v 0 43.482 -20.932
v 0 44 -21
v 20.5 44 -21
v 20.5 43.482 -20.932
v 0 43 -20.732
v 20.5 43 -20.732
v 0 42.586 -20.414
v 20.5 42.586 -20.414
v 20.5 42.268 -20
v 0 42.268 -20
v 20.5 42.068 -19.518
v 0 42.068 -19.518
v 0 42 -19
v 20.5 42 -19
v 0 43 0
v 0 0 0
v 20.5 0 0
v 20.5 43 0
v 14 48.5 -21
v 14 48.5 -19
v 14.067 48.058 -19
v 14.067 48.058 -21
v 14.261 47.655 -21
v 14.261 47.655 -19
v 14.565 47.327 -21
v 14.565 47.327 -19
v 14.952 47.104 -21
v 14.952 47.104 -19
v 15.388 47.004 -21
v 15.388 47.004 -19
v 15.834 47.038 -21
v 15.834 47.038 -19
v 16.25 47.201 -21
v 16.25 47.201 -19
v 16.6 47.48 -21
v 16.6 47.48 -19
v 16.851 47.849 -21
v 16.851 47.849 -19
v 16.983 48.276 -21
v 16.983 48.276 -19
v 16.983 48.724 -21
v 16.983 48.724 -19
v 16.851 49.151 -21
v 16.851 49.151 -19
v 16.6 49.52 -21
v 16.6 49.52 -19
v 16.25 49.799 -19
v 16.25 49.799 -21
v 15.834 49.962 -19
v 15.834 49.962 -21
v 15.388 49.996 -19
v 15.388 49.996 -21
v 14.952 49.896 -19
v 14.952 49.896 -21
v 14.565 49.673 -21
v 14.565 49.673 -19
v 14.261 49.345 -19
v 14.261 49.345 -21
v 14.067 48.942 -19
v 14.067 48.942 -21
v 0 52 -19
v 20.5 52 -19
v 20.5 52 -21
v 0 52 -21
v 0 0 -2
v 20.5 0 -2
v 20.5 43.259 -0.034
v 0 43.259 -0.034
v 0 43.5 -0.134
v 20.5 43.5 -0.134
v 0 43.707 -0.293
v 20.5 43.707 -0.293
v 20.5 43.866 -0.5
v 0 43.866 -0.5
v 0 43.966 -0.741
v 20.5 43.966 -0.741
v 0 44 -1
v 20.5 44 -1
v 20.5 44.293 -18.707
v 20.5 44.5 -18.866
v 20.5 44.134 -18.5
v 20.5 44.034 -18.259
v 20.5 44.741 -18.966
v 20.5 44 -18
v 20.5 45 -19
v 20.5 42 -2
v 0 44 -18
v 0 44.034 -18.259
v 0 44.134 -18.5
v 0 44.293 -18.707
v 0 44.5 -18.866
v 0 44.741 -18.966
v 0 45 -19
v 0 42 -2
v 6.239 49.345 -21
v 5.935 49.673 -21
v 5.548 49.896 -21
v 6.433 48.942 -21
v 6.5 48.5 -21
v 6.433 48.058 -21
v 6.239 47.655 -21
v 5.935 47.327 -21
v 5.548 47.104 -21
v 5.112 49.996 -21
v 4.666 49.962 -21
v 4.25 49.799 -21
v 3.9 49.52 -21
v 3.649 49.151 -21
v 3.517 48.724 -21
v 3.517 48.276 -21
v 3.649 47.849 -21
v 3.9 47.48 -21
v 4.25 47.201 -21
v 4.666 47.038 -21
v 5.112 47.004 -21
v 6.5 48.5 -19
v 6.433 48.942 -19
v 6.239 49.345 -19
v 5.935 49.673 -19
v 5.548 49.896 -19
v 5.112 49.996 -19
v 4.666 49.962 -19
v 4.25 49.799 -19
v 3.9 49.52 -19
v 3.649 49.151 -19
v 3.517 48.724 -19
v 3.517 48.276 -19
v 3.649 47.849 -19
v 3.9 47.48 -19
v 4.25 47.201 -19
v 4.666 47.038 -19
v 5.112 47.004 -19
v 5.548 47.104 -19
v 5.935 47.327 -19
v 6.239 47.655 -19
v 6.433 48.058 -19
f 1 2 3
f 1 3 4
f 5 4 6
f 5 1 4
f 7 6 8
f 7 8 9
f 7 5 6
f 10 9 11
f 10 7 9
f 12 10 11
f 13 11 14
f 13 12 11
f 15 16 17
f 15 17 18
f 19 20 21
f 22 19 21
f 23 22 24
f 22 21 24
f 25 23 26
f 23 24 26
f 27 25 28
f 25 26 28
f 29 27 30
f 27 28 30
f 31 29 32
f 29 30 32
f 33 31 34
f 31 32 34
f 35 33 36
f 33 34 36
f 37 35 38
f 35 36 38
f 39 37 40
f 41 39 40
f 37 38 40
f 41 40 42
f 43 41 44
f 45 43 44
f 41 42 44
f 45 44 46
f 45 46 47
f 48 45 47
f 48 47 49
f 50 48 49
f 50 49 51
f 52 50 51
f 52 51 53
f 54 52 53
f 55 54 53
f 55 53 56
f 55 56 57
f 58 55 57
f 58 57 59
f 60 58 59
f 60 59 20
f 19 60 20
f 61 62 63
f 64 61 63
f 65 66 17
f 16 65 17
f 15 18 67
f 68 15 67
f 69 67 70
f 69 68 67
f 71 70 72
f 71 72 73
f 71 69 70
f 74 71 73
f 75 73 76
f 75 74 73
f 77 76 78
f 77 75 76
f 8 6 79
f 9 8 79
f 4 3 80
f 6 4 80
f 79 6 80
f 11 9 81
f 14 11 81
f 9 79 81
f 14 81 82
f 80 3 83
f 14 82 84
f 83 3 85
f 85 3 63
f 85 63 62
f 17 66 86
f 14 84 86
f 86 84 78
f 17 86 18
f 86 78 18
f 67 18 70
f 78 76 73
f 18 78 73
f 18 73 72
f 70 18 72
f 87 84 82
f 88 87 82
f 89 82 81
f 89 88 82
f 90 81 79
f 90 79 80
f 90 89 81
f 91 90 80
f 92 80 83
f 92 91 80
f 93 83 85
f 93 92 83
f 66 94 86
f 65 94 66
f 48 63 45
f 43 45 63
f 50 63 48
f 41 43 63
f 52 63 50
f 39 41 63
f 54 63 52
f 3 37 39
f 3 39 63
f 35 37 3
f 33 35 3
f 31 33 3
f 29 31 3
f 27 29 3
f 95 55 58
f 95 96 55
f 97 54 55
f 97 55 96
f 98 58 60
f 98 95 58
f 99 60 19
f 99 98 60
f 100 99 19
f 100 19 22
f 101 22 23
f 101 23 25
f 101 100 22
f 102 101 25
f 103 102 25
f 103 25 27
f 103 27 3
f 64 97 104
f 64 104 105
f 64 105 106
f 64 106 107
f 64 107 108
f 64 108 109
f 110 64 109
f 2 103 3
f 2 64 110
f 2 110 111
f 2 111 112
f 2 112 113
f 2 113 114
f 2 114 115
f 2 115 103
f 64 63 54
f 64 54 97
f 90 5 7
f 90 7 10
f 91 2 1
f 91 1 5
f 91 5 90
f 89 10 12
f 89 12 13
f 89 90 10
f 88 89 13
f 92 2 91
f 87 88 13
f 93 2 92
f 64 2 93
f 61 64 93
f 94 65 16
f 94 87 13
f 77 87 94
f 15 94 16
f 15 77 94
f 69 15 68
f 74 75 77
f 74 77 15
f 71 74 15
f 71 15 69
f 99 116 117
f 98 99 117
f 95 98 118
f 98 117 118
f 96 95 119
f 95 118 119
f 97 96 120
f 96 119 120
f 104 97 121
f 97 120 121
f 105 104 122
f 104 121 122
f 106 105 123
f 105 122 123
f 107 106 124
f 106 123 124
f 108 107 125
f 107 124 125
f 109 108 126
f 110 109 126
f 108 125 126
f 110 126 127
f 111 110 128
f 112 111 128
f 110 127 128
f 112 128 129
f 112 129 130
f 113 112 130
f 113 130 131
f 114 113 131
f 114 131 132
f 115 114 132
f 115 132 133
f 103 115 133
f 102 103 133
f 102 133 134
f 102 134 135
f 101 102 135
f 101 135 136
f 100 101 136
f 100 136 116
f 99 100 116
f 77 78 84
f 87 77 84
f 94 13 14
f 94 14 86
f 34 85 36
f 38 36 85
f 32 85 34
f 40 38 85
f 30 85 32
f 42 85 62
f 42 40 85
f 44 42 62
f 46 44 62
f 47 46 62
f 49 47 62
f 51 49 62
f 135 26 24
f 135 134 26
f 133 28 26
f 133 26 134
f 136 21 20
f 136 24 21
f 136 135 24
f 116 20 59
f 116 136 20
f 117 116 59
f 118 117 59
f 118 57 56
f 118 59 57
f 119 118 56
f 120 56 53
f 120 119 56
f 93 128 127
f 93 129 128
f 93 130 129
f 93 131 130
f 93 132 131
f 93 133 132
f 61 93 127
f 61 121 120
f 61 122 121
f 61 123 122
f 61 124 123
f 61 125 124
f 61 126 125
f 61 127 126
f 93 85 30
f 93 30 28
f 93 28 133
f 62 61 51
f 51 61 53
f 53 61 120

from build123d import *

# Parameters (mm, degrees)
BOSS_EXTRUDE1_DEPTH = 20.5
SKETCH2_R           = 1.5
CUT_EXTRUDE1_DEPTH  = 60.036005962


with BuildPart() as part:
    # Sketch1 → Boss-Extrude1 (new body)
    with BuildSketch(Plane(origin=(0, 0, 0), x_dir=(0, 0, -1), z_dir=(1, 0, 0))):
        with BuildLine():
            Line((0, 0), (0, 43))
            ThreePointArc((0, 43), (0.292893219, 43.707106781), (1, 44))
            Line((1, 44), (18, 44))
            ThreePointArc((18, 44), (18.707106781, 44.292893219), (19, 45))
            Line((19, 45), (19, 52))
            Line((19, 52), (21, 52))
            Line((21, 52), (21, 44))
            ThreePointArc((21, 44), (20.414213562, 42.585786438), (19, 42))
            Line((19, 42), (2, 42))
            Line((2, 42), (2, 0))
            Line((2, 0), (0, 0))
        make_face()
    extrude(amount=BOSS_EXTRUDE1_DEPTH)

    # Sketch2 → Cut-Extrude1 (cut, through all)
    with BuildSketch(Plane.XY.offset(-19)):
        with Locations((5, 48.5)):
            Circle(SKETCH2_R)
        with Locations(Location((15.5, 48.5, 0), (0, 0, 180))):
            Circle(SKETCH2_R)
    extrude(amount=-CUT_EXTRUDE1_DEPTH, mode=Mode.SUBTRACT)


solid = part.part
